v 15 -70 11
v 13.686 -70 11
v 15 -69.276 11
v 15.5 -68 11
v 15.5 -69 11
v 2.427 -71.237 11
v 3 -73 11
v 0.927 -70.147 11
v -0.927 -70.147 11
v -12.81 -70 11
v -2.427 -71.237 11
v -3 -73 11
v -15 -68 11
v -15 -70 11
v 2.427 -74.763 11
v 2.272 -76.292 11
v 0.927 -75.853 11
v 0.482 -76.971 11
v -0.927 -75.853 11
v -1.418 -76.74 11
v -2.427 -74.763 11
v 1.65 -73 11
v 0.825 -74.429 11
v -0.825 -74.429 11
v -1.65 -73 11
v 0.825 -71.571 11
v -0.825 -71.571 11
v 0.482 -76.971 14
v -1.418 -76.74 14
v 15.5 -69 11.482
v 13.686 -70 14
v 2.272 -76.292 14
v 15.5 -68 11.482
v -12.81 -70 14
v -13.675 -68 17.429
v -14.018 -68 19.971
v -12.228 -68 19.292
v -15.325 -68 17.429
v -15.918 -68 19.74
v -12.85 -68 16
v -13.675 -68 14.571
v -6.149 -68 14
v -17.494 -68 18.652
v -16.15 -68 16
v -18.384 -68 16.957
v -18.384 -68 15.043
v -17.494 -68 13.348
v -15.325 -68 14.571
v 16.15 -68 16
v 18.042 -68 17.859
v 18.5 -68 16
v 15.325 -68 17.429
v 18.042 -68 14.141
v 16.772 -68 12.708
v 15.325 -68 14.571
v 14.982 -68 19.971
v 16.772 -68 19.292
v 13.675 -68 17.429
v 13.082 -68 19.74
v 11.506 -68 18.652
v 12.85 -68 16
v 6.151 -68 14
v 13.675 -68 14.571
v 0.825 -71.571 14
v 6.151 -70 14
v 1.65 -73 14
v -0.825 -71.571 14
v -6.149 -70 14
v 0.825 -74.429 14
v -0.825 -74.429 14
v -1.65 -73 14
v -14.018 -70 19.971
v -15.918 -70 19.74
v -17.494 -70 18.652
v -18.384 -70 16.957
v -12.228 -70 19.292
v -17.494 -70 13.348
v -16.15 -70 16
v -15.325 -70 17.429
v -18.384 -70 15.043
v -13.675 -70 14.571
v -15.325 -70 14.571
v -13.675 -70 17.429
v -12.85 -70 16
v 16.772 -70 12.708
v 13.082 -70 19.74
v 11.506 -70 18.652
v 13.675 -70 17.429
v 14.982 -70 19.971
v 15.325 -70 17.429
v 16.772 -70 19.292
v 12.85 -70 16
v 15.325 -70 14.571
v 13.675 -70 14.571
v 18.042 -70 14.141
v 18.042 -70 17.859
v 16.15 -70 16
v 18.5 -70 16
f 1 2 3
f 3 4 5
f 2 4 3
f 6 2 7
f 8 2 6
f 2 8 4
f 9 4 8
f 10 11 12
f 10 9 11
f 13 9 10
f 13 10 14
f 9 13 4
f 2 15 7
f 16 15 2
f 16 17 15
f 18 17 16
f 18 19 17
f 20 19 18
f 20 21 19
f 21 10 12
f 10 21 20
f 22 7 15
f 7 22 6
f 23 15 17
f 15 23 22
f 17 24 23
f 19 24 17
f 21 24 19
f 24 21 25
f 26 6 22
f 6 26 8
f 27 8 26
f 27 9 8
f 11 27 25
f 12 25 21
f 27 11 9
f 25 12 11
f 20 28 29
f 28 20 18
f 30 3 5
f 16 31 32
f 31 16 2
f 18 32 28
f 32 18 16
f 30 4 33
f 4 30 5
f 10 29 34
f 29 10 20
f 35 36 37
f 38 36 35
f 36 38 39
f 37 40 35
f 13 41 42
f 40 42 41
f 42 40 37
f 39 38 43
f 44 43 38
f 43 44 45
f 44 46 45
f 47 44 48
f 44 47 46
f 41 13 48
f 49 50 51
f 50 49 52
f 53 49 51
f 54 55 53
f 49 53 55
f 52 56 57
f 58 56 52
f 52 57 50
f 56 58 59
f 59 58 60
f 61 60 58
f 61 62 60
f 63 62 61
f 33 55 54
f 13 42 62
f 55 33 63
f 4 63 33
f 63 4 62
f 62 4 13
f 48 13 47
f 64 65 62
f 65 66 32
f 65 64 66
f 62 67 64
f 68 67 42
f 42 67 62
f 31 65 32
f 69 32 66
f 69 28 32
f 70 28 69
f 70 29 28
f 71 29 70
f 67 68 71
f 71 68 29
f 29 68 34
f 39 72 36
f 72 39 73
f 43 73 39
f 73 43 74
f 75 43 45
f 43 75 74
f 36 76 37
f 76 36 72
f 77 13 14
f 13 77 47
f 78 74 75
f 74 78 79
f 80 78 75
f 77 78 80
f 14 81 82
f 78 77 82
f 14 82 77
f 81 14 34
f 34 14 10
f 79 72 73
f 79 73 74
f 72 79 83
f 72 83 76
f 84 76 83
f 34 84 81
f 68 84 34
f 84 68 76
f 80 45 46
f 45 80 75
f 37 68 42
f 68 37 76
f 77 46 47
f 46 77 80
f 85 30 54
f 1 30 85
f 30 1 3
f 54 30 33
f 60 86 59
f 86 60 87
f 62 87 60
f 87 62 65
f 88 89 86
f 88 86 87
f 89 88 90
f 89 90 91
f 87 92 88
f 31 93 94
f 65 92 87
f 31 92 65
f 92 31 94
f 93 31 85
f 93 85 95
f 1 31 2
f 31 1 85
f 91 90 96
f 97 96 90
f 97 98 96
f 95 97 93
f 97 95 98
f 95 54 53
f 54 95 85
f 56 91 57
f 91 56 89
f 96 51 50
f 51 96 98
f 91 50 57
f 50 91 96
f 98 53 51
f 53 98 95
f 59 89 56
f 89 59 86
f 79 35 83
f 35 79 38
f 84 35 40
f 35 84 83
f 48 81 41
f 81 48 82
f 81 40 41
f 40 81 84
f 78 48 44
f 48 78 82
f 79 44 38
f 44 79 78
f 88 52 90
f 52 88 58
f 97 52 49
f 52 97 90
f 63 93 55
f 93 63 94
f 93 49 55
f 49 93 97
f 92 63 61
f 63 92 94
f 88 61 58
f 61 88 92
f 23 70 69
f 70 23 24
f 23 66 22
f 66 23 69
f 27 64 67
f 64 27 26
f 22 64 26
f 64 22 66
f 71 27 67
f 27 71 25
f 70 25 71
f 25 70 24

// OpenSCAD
// file: wingadapter.scad
// Wing adapter with body post

$fs = 0.1;
yd = 10;
m4_d = 4.2;
m3_d = 3.1;
s_dist = 14.5;
post_dist = 24;
lip_dist = 28;
hh = 9.5;
mount_dist = 54;

xx = 24;

m_x1 = 14.8;
m_x2 = 7.9;
m_y = 32;
m_z1 = 2.5;
m_z2 = 2.5;

wingadapter_p();

module wingadapter_p() {
    difference() {
        union() {
            difference() {
                union() {
                    hull() {
                        translate([0,0,0]) cylinder(d = yd, h=hh);
                        translate([0,s_dist,0]) cylinder(d = yd+5, h=hh);
                        translate([0,post_dist,0]) cylinder(d = yd, h=hh);
                    }
                    hull() {
                        translate([0,s_dist,0]) cylinder(d = yd+5, h=hh);
                        translate([-xx/2,lip_dist,0]) cube([xx, 6, hh]);
                        translate([0,mount_dist,0]) cylinder(d = 3, h=hh);
                    }
                    translate([-xx/2,lip_dist,0]) cube([xx, 6, hh+2.5]);
                    
                    
                    
                }
                translate([-50/2,mount_dist-m_y/2,0]) cube([50, m_y, 100]);
            }
            translate([-m_x1/2,mount_dist-m_y/2,0]) cube([m_x1, m_y, m_z1]);
            translate([-m_x2/2,mount_dist-m_y/2,m_z1]) cube([m_x2, m_y, m_z2]);
        }
        // screw holes
        translate([0,0,0])      cylinder(d = m4_d, h=hh);
        translate([0,s_dist,0]) cylinder(d = m4_d, h=hh);
        translate([0,post_dist,0]) cylinder(d = m3_d, h=hh);
        translate([0,mount_dist,0])  cylinder(d = m3_d, h=hh+m_z1+m_z2);
        
        translate([0,post_dist,4]) cylinder(d = 6.5, h=hh);
        
        //muttrar
        translate([0,mount_dist,0])  cylinder(d=6.5, h=2.5, $fn=6);
        
        translate([0,0,0]) rotate([0,0,360/12]) cylinder(d=8, h=4, $fn=6);
        translate([0,s_dist,0]) rotate([0,0,360/12]) cylinder(d=8, h=4, $fn=6);
    }
}
// file: caster_hub.scad
//
use <lexan_nose.scad>
use <common_parts.scad>
include <tunable_constants.scad>;
$fs=0.1;

caster = S_CASTER;
camber = S_CAMBER;

kingpin_d = C_KINGPIN_LOOSE; //3.5;

space = 19; // mellanrummet inuti hubben

m3_d = 3; // hål som en skruv inte ska fästa i
m3_d_s = 2.8; // hål som skruven ska skapa gängor i

color("red")%nose_p();
translate([0,240,0]) % union() {
    upper_arm();
    mirror([1,0,0]) upper_arm(); 


    lower_arm();
    mirror([1,0,0]) lower_arm();

    color("yellow") arm_plate();
    color("green") translate([0,-115,30]) upper_arm_plate_p();
}

translate([-62,240-25,23]) caster_p();
caster_p();

 rotate([0,0,180]) translate([-90, 275, -20])  %import("ref/testhub.stl", convexity=10);
 rotate([0,0,180+45]) translate([-90, 275, -20])  %import("ref/testhub.stl", convexity=10);
 rotate([0,0,180-30]) translate([-90, 275, -20])  %import("ref/testhub.stl", convexity=10);
module caster_p() {
    difference() {
        union() {
            hull() {
                translate([0,-1,space/2]) cylinder(d=10, h=3);
                translate([0,-15/2,space/2]) cube([10,15,3]);
            }
            hull() {
                translate([0,1,-space/2-3]) cylinder(d=10, h=3);
                translate([0,-15/2,-space/2-3]) cube([10,15,3]);
            }
            
            hull() {
                translate([10+2.5, 0, space/2-3]) cylinder(d=8, h=3);
                translate([10+2.5+5, -12, space/2-3]) cylinder(d=8, h=3);
            }
            hull() {
                translate([10,15/2-10,-space/2]) cube([1,10,space]);
            
                translate([10+2.5,0,-space/2]) cylinder(d=8, h=space);
            }
        }
        rotate([0,camber,0]) rotate([caster,0,0]) translate([0,0,-50]) cylinder(d=kingpin_d, h = 100);
        %rotate([0,camber,0]) rotate([caster,0,0]) translate([0,0,-50]) cylinder(d=kingpin_d, h = 100);
        
        translate([10+2.5,0,-space/2-10]) cylinder(d=m3_d_s, h=space+50);
        
        translate([-25, 10, -25]) rotate([0,0,-10]) cube([50,50,50,]);
    }
}
module caster_rod() {

    rotate([0,camber,0]) rotate([caster,0,0]) translate([0,0,-50]) cylinder(d=kingpin_d, h = 100);
    //%rotate([0,camber,0]) rotate([caster,0,0]) translate([0,0,-50]) cylinder(d=kingpin_d, h = 100);
        

}
caster_rod();

module caster_visual() {
    
     rotate([0,0,180]) translate([-90, 275, -20])  %import("ref/testhub.stl", convexity=10);
 rotate([0,0,180+45]) translate([-90, 275, -20])  %import("ref/testhub.stl", convexity=10);
 rotate([0,0,180-30]) translate([-90, 275, -20])  %import("ref/testhub.stl", convexity=10);
}
// file: lexan_side_stab.scad
// file for viewing parts when edit

use <lexan_main-chassie.scad>
use <lexan_nose.scad>

%translate([-115, -67, -93])  rotate([0,-90,-90]) import("ref/Cradle.stl", convexity=10);

color("green") % side_spring_plate_p();


color("lightblue") %main_chassie_p();

%battery_plate_p();


//translate([0,0,5]) side_stab_p();
translate([-50-55,0,5]) side_stab2_p();

module side_stab_p() {
    
    
    $fs=0.1;
    
    s_x1 = 36;
    s_x2 = 50;
    s_z = 7;
    
    
    difference() {
        union() {
            translate([s_x1,-8,-s_z/2]) cube([5,10,s_z]);
            translate([s_x1,0,-s_z/2]) cube([s_x2-s_x1,5,s_z]);
            hull() {
                translate([s_x2,  60 , -s_z/2]) cube([3,6,s_z]);
                translate([s_x2,  0 , -s_z/2]) cube([2,10,s_z]);
            }
        }
        translate([s_x1-1,-4,0])rotate([0,90,0]) cylinder(d=3, h=10);
        translate([s_x2-1,62,0])rotate([0,90,0]) cylinder(d=3, h=10);
    }
}

module side_stab2_p() {
    
    
    $fs=0.1;
    
    s_x1 = 53;
    s_x2 = 53;
    s_z = 7;
    s_w = 2.5;
    s_d1 = 10;
    s_d2 = 6;
    
    difference() {
        union() {
            hull() {
                translate([s_x1,-4,0])rotate([0,90,0]) cylinder(d=s_d1, h=s_w);
                translate([s_x1,-4+10,0])rotate([0,90,0]) cylinder(d=s_d2, h=s_w);
            }
            hull() {
                translate([s_x2,63,0])rotate([0,90,0]) cylinder(d=s_d1, h=s_w);
                translate([s_x2,63-10,0])rotate([0,90,0]) cylinder(d=s_d2, h=s_w);
            }
            hull() {
                translate([s_x1,-4+10,0])rotate([0,90,0]) cylinder(d=s_d2, h=s_w);       
                translate([s_x2,63-10,0])rotate([0,90,0]) cylinder(d=s_d2, h=s_w);
            }
        }
        translate([s_x1-1,-4,0])rotate([0,90,0]) cylinder(d=3, h=10);
        translate([s_x2-1,63,0])rotate([0,90,0]) cylinder(d=3, h=10);
    }
}
// file: common_parts.scad
include <tunable_constants.scad>;
//common_flat_screw_tap();
module common_flat_screw_tap(l = 10, l2 = 0) {
    // l2 is amount of the screw that are bigger for sliding through the hole
    tap_z = 1.9;
    union() {
        cylinder(d = C_M3_DIAMETER_THREAD, h= l);
        cylinder(d = C_M3_DIAMETER, h= l2);
        translate([0,0,-0.1+0.1]) cylinder(d1 = 6.5, d2= C_M3_DIAMETER_THREAD, h= tap_z);
        translate([0,0,-0.1]) cylinder(d = 6.5, h= 0.3);
    }
}

module common_button_screw_tap(l = 10, l2 = 0) {
    
    tap_z = 1.1;
    union() {
        cylinder(d = C_M3_DIAMETER_THREAD, h= l);
        cylinder(d = C_M3_DIAMETER, h= l2);
        translate([0,0,-4]) cylinder(d = 6, h=4);
    }
}

module roundedcube(xdim ,ydim ,zdim,rdim){
    hull(){
        fn=30;
        translate([rdim,rdim,0]) cylinder(r=rdim, h=zdim, $fn=fn);
        translate([xdim-rdim,rdim,0])cylinder(r=rdim, h=zdim, $fn=fn);

        translate([rdim,ydim-rdim,0]) cylinder(r=rdim, h=zdim, $fn=fn);
        translate([xdim-rdim,ydim-rdim,0]) cylinder(r=rdim, h=zdim, $fn=fn);
    }
}

module cylinder_outer(height,radius,fn){
   fudge = 1/cos(180/fn);
   cylinder(h=height,r=radius*fudge,$fn=fn);
}

indicator_dots(2);

module indicator_dots(valueIn) {
    for (a =[0:1:valueIn-1]) {
        translate([a*3,0,0]) cube([2,2,1]);
    }
}
// file: tunable_constants.scad
// Change parameters to fit your printer and slicer differences

C_M3_DIAMETER = 3.3; // size of a hole that a M3 screw will slide through
C_M3_DIAMETER_THREAD = 2.8; // size of a hole that a M3 screw will create own threads in

C_M3_NUT = 7;

C_KINGPIN_LOOSE = 3.5; // The hole for kingpin in the arms that are suposed to slide
C_KINGPIN_SNUG = 3.3; // The hole in the steering hub where the kingpin is suposed to be tightly locked with a screw

C_M4_NUT = 8.4;

C_M4_DIAMETER = 4.1; // size of a hole that a M4 screw will slide through
C_M4_DIAMETER_THREAD = 3.8; // size of a hole that a M4 screw will create own threads in

    b_12mm_tol = 0.3; // tolerance for bearing with 12mm diameter

C_12MM_BEARING_D = 12+b_12mm_tol; // Size of a hole that hold a 12mm bearing
C_12MM_BEARING_H = 3.5;

C_8MM_LOOSE = 8.7; // Loose fitting that will guarantie that it will not touch
C_8MM_TIGHT = 8.2; // Tight fitting for indrive etc
C_8MM_FIT = 8.5; // Perfect fit for it to be removable but not by much force, used for left wheel mount

// ############# Settings ################
S_CASTER = 4;

S_CAMBER = 2;
// main file
//
include <tunable_constants.scad>;
use <hpdf1_rear_cradle_universal.scad>
use <common_parts.scad>

//rearCradle();
translate([0,-64-4,11]) diffuser_mount();

winghole_dist = 29;
diffuserhole_from_wingplate = 5;

module diffuser_mount() {
    
    
    difference() {
        union() {
            
            hull() {
                
                translate([0,-diffuserhole_from_wingplate,0]) cylinder(d=8, h=3);
                translate([winghole_dist/2,-1,0]) cube([1,1,3]);
                translate([-winghole_dist/2,-1,0]) cube([1,1,3]);
            }
            hull() {
                
                translate([-winghole_dist/2,0,5]) rotate([90,0,0])cylinder(d=8, h=2);
                //translate([winghole_dist/2,-2,0]) cube([1,2,2]);
                translate([-15,-2,0]) cube([10,2,2]);
            }
            hull() {
                
                translate([winghole_dist/2,0,5]) rotate([90,0,0])cylinder(d=8, h=2);
                //translate([winghole_dist/2,-2,0]) cube([1,2,2]);
                translate([5,-2,0]) cube([10,2,2]);
            }
        }
        all_screws();
        %all_screws();
    }
}

module all_screws() {
    translate([-winghole_dist/2,-3,5]) rotate([-90,0,0]) common_button_screw_tap(l = 12, l2=3);
    translate([winghole_dist/2,-3,5]) rotate([-90,0,0]) common_button_screw_tap(l = 12, l2=3);
    translate([0,-diffuserhole_from_wingplate,0]) common_button_screw_tap(l = 12, l2=3);;
}
